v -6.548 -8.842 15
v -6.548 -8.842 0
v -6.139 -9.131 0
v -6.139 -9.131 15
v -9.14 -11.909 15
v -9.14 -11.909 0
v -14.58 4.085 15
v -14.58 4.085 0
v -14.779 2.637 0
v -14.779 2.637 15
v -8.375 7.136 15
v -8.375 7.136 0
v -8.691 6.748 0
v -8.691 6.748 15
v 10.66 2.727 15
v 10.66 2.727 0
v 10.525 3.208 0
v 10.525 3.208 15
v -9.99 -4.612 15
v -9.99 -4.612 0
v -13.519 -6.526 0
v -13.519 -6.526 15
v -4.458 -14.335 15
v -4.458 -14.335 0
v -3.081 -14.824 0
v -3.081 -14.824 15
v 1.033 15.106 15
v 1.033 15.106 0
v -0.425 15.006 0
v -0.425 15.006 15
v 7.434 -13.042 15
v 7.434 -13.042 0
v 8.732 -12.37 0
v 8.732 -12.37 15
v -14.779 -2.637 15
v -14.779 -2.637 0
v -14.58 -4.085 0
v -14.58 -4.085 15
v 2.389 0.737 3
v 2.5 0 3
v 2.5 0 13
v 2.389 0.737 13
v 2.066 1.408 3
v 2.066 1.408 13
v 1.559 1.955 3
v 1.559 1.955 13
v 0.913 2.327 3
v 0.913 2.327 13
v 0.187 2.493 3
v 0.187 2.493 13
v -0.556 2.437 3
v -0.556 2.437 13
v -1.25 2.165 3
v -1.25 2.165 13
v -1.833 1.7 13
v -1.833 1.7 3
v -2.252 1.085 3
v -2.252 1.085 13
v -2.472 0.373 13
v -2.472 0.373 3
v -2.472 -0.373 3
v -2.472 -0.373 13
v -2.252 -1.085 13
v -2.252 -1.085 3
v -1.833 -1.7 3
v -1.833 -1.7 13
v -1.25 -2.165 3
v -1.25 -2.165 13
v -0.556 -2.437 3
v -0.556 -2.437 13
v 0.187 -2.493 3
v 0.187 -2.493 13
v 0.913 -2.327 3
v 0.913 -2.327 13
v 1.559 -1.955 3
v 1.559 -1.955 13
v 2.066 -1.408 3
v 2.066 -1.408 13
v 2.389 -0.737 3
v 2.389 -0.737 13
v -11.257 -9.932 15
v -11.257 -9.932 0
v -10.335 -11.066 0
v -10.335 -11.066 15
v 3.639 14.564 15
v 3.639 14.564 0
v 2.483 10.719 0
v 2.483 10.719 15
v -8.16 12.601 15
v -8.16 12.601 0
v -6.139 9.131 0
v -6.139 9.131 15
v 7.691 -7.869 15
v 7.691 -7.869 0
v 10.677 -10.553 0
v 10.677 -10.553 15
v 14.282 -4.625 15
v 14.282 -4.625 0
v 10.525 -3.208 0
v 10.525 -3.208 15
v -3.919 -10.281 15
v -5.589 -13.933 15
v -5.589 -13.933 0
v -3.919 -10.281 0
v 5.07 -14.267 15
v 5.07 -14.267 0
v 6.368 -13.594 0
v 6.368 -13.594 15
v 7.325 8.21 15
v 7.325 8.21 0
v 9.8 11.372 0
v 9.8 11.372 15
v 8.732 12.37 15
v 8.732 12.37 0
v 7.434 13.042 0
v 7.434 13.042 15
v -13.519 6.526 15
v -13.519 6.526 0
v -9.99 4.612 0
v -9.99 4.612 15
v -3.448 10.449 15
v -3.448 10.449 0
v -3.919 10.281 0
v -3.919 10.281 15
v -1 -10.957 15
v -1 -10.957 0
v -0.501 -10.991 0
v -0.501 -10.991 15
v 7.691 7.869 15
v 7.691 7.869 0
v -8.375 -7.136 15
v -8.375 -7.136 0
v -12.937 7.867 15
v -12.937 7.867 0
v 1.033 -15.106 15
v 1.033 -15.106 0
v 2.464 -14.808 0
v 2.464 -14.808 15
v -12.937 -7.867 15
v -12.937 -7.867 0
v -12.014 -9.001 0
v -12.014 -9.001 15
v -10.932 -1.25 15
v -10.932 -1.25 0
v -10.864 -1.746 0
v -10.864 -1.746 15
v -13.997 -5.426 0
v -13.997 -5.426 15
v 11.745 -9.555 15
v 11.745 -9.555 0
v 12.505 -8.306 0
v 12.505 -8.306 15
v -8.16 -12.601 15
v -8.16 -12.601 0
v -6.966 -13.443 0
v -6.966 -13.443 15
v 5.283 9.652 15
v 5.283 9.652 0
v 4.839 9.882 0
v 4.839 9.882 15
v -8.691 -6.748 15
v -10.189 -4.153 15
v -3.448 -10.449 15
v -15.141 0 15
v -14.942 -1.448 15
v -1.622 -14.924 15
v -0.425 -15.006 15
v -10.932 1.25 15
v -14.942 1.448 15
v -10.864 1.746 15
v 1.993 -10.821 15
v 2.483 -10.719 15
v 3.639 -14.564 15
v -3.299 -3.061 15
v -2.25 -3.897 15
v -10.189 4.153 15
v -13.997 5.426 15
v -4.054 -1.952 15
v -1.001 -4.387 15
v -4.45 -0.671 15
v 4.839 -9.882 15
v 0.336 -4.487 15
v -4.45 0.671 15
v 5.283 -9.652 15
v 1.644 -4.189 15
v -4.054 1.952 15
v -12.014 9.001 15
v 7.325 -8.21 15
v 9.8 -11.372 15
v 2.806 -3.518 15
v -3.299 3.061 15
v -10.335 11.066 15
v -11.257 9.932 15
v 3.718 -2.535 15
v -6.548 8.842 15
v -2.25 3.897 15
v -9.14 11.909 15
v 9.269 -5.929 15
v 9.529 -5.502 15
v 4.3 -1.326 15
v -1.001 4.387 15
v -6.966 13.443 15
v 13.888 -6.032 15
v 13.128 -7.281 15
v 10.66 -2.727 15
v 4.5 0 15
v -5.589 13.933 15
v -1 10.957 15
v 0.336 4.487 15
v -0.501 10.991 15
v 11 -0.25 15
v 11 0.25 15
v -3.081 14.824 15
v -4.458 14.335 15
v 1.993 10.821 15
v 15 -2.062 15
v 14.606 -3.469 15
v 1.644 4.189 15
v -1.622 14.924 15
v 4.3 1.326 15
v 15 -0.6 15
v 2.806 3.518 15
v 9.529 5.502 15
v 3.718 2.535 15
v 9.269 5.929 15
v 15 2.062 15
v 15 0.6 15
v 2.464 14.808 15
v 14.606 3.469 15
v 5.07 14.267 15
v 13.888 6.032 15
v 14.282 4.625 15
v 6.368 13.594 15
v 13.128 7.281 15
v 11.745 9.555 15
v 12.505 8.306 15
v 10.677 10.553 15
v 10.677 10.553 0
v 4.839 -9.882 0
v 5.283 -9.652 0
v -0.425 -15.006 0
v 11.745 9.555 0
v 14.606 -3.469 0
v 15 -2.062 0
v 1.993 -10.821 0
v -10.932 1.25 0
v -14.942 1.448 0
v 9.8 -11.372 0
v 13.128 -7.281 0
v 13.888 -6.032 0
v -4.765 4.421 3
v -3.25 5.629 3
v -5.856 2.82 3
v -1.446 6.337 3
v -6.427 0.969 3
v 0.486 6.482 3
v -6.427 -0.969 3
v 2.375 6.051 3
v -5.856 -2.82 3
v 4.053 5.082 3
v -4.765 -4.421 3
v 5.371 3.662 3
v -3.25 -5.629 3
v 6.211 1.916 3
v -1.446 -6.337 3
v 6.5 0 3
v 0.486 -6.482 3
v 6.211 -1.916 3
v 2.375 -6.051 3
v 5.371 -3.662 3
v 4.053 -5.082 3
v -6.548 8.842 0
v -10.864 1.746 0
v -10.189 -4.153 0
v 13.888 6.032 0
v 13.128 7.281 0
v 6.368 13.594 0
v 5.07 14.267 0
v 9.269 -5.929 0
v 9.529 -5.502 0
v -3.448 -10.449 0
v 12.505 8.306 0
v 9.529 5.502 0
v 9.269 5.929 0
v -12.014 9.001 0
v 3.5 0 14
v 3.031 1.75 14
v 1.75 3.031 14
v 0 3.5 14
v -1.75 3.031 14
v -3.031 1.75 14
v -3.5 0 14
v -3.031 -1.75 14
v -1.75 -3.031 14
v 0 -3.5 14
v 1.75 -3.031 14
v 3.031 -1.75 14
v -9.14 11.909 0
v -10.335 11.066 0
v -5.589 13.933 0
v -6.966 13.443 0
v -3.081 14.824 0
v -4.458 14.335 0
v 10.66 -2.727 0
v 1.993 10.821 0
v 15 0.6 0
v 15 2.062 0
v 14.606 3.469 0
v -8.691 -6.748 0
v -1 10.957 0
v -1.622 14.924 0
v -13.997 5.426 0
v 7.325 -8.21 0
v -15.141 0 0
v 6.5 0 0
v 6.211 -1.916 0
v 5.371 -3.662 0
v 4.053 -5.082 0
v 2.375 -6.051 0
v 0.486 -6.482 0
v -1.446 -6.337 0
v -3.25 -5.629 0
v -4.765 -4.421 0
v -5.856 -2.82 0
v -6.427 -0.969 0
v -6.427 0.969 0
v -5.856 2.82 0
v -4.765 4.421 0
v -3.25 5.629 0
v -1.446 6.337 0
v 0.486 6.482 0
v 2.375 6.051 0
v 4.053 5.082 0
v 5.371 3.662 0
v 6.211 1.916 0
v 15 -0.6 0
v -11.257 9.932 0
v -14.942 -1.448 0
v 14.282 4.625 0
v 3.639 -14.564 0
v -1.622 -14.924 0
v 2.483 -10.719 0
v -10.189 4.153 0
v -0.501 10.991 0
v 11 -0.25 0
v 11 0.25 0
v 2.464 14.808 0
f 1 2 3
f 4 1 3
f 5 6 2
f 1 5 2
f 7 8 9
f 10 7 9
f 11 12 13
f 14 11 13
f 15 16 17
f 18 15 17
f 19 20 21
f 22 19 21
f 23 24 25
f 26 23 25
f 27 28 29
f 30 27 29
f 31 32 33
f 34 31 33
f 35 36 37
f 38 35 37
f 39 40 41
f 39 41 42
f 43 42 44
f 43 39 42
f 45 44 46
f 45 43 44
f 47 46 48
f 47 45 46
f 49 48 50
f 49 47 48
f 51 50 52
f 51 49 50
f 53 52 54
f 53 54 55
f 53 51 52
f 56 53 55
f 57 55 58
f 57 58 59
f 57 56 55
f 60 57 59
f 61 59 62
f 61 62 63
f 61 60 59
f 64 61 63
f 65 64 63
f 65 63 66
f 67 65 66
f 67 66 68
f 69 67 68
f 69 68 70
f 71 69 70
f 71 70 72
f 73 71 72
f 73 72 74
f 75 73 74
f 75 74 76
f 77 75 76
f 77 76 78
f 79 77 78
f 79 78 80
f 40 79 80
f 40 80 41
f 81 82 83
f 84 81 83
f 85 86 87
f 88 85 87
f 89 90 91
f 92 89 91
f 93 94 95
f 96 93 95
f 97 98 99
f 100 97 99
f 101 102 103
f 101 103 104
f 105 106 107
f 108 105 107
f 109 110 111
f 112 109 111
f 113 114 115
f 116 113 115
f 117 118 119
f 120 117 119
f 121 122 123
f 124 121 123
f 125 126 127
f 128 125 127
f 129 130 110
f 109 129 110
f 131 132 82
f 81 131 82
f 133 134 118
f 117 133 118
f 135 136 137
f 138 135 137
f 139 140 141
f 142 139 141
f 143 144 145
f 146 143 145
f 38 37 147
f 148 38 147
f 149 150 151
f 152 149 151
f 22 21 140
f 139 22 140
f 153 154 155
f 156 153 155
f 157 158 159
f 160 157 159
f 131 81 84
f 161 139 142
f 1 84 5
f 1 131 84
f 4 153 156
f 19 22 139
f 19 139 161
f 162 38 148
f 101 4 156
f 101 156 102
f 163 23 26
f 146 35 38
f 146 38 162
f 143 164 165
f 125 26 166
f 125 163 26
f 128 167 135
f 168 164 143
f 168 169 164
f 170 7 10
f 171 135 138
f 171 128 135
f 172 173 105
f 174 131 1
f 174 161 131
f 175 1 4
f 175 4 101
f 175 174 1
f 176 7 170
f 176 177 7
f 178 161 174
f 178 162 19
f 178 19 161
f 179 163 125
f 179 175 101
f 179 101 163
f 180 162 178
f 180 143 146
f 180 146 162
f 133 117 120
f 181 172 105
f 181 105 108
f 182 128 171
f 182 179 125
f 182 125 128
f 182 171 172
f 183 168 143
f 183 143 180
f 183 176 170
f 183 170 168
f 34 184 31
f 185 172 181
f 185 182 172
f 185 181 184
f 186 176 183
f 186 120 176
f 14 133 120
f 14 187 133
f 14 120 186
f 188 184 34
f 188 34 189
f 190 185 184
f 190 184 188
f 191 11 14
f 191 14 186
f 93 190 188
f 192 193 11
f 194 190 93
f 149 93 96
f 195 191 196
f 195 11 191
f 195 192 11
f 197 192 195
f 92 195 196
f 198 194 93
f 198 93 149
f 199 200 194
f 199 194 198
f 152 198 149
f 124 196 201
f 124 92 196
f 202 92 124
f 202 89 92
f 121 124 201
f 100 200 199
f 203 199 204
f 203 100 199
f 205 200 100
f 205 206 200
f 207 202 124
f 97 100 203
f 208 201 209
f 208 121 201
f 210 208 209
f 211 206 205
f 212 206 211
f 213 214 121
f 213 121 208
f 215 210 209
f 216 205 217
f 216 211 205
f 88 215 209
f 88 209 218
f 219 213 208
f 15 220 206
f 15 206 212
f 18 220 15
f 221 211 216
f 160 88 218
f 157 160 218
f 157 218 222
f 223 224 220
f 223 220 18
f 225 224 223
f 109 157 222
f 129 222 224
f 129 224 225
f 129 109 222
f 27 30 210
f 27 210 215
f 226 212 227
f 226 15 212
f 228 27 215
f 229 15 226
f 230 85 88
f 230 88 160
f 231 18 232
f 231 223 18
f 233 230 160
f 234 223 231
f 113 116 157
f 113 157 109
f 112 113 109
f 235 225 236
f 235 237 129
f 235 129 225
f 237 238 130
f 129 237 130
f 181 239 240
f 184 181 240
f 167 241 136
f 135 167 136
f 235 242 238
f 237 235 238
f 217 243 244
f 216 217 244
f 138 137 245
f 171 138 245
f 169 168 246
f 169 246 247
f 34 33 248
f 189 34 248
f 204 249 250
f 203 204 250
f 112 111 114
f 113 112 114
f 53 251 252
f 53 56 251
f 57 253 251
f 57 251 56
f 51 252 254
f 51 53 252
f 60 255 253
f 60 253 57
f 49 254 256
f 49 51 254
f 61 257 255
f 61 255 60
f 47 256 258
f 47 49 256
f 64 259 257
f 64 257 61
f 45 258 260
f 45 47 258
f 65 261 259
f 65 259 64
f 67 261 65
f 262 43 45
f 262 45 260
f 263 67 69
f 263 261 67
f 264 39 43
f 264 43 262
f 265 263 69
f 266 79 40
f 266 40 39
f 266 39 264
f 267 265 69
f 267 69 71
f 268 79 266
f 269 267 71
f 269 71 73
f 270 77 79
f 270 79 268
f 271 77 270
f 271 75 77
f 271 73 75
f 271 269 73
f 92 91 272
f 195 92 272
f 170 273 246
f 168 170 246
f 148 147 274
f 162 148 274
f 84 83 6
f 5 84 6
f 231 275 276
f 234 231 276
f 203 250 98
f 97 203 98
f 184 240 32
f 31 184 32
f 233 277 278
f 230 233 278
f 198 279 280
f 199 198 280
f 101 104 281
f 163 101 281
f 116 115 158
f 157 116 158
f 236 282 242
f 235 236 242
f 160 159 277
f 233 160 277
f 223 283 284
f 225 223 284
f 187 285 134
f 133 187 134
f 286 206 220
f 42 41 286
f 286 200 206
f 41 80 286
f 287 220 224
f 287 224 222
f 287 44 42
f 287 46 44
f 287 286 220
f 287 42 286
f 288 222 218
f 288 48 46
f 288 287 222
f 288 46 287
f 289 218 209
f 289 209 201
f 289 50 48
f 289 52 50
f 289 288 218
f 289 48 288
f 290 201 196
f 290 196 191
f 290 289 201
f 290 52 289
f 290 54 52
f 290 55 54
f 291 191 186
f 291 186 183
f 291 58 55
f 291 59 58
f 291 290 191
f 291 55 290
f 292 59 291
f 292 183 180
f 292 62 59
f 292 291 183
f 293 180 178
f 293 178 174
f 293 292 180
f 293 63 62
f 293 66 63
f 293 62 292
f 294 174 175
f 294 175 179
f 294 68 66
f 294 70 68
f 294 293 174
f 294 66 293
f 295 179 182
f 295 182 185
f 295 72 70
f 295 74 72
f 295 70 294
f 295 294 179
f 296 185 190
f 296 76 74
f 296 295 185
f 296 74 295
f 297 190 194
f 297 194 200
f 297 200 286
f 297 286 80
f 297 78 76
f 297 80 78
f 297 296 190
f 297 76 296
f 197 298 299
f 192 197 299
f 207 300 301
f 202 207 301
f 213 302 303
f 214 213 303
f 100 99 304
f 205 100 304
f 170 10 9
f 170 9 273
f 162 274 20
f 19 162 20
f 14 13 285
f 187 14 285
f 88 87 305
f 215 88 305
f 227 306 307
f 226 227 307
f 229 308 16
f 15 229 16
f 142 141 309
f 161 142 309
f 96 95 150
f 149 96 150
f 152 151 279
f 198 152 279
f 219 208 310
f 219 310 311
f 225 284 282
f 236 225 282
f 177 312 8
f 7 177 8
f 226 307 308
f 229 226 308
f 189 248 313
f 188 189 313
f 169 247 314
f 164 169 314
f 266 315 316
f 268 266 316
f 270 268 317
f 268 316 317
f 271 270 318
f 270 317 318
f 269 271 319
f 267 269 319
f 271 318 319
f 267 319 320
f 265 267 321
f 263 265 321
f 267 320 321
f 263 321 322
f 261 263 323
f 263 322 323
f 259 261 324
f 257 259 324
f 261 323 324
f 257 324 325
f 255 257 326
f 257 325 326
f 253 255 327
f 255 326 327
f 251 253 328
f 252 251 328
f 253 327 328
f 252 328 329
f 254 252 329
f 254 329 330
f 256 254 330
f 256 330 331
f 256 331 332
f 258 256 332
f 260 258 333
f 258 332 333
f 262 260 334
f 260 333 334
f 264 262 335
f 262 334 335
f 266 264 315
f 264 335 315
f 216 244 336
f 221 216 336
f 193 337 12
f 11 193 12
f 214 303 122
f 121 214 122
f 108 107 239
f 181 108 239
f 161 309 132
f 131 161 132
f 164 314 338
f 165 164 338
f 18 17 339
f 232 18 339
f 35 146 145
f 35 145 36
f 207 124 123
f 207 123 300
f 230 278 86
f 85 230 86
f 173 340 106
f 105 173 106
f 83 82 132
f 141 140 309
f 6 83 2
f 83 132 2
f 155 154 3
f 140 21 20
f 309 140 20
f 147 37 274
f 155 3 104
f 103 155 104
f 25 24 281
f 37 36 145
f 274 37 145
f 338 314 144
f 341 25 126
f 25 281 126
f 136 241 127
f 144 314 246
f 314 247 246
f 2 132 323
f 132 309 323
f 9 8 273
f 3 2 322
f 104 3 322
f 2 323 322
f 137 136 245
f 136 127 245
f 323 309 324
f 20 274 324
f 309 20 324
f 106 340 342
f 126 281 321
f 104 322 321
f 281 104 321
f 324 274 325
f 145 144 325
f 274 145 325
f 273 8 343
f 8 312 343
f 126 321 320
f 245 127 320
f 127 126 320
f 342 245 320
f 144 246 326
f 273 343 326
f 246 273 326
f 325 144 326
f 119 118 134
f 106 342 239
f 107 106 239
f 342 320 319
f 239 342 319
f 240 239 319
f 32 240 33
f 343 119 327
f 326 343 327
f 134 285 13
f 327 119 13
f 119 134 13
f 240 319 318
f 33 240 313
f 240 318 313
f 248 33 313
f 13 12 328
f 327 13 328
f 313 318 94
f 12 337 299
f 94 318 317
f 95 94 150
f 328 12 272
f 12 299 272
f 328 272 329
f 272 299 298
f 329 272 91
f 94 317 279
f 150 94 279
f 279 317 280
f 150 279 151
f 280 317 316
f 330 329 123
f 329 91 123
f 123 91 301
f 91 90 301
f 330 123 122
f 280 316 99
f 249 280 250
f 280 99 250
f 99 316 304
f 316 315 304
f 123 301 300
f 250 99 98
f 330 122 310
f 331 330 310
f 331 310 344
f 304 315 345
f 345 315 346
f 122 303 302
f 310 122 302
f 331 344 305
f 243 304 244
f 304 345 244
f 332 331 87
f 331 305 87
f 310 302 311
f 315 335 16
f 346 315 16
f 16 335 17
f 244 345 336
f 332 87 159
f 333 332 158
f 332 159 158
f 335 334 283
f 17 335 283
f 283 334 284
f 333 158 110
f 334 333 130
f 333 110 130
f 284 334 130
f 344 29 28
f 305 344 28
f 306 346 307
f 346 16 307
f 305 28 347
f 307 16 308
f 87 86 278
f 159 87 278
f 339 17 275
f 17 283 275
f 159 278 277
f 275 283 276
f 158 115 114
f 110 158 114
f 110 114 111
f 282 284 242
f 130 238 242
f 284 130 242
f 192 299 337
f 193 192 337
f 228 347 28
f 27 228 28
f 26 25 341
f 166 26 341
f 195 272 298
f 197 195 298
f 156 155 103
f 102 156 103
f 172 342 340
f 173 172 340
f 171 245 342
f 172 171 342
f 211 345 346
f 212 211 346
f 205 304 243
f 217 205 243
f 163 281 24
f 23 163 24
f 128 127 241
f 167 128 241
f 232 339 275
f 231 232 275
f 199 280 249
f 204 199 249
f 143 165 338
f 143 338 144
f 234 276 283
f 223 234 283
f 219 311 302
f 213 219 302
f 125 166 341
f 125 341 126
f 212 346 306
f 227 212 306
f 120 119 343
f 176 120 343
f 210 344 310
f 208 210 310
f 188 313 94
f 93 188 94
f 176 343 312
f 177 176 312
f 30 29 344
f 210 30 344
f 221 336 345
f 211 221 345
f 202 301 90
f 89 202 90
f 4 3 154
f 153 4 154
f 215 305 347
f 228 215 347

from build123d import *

# Parameters (mm, degrees)
F0_R     = 2.5
F1_DEPTH = 15
F2_R     = 6.5
F3_DEPTH = 3
F4_SIZE  = 2


with BuildPart() as f1:
    # F0 (on Top) → F1 (new body)
    with BuildSketch(Plane.XY):
        Polygon((15, 0.599955), (15, 2.061703), (14.605625, 3.469245), (10.659539, 2.727035), (10.524641, 3.208494), (14.281893, 4.624658), (13.887519, 6.032201), (13.128018, 7.281146), (9.528509, 5.501819), (9.268717, 5.929028), (12.504564, 8.306372), (11.745064, 9.555318), (10.676766, 10.553039), (7.690794, 7.868557), (7.325376, 8.209834), (9.799829, 11.37204), (8.731531, 12.369761), (7.433666, 13.04226), (5.282687, 9.651721), (4.838744, 9.881754), (6.368285, 13.594296), (5.07042, 14.266796), (3.639246, 14.564197), (2.482787, 10.719061), (1.993245, 10.820789), (2.464434, 14.808326), (1.03326, 15.105727), (-0.42508, 15.005974), (-0.501249, 10.991417), (-1.000084, 10.957296), (-1.622192, 14.924089), (-3.080532, 14.824336), (-4.45788, 14.334826), (-3.448111, 10.44859), (-3.919241, 10.28115), (-5.588508, 13.933001), (-6.965856, 13.443492), (-8.16006, 12.60053), (-6.139241, 9.130839), (-6.547726, 8.842499), (-9.14035, 11.908566), (-10.334554, 11.065605), (-11.257045, 9.931711), (-8.375052, 7.135895), (-8.690596, 6.74804), (-12.014294, 9.000928), (-12.936785, 7.867033), (-13.519147, 6.526302), (-9.989724, 4.611715), (-10.188925, 4.153109), (-13.997192, 5.425731), (-14.579554, 4.084999), (-14.778595, 2.636866), (-10.863504, 1.745505), (-10.931587, 1.250162), (-14.941983, 1.448133), (-15.141024, 0), (-14.941983, -1.448133), (-10.931587, -1.250162), (-10.863504, -1.745505), (-14.778595, -2.636866), (-14.579554, -4.084999), (-13.997192, -5.425731), (-10.188925, -4.153109), (-9.989724, -4.611715), (-13.519147, -6.526302), (-12.936785, -7.867033), (-12.014294, -9.000928), (-8.690596, -6.74804), (-8.375052, -7.135895), (-11.257045, -9.931711), (-10.334554, -11.065605), (-9.14035, -11.908566), (-6.547726, -8.842499), (-6.139241, -9.130839), (-8.16006, -12.60053), (-6.965856, -13.443492), (-5.588508, -13.933001), (-3.919241, -10.28115), (-3.448111, -10.44859), (-4.45788, -14.334826), (-3.080532, -14.824336), (-1.622192, -14.924089), (-1.000084, -10.957296), (-0.501249, -10.991417), (-0.42508, -15.005974), (1.03326, -15.105727), (2.464434, -14.808326), (1.993245, -10.820789), (2.482787, -10.719061), (3.639246, -14.564197), (5.07042, -14.266796), (6.368285, -13.594296), (4.838744, -9.881754), (5.282687, -9.651721), (7.433666, -13.04226), (8.731531, -12.369761), (9.799829, -11.37204), (7.325376, -8.209834), (7.690794, -7.868557), (10.676766, -10.553039), (11.745064, -9.555318), (12.504564, -8.306372), (9.268717, -5.929028), (9.528509, -5.501819), (13.128018, -7.281146), (13.887519, -6.032201), (14.281893, -4.624658), (10.524641, -3.208494), (10.659539, -2.727035), (14.605625, -3.469245), (15, -2.061703), (15, -0.599955), (11, -0.25), (11, 0.25), align=None)
        Circle(F0_R, mode=Mode.SUBTRACT)
    extrude(amount=F1_DEPTH)

    # F2 (on face) → F3 (cut)
    with BuildSketch(Plane(origin=(0, 0, 0), x_dir=(1, 0, 0), z_dir=(0, 0, -1))):
        Circle(F2_R)
    extrude(amount=-F3_DEPTH, mode=Mode.SUBTRACT)

    # F4
    f4_edges = [f1.edges().sort_by_distance(p)[0] for p in [
        (-2.5, 0, 15),
    ]]
    chamfer(f4_edges, length=F4_SIZE)


solid = f1.part
